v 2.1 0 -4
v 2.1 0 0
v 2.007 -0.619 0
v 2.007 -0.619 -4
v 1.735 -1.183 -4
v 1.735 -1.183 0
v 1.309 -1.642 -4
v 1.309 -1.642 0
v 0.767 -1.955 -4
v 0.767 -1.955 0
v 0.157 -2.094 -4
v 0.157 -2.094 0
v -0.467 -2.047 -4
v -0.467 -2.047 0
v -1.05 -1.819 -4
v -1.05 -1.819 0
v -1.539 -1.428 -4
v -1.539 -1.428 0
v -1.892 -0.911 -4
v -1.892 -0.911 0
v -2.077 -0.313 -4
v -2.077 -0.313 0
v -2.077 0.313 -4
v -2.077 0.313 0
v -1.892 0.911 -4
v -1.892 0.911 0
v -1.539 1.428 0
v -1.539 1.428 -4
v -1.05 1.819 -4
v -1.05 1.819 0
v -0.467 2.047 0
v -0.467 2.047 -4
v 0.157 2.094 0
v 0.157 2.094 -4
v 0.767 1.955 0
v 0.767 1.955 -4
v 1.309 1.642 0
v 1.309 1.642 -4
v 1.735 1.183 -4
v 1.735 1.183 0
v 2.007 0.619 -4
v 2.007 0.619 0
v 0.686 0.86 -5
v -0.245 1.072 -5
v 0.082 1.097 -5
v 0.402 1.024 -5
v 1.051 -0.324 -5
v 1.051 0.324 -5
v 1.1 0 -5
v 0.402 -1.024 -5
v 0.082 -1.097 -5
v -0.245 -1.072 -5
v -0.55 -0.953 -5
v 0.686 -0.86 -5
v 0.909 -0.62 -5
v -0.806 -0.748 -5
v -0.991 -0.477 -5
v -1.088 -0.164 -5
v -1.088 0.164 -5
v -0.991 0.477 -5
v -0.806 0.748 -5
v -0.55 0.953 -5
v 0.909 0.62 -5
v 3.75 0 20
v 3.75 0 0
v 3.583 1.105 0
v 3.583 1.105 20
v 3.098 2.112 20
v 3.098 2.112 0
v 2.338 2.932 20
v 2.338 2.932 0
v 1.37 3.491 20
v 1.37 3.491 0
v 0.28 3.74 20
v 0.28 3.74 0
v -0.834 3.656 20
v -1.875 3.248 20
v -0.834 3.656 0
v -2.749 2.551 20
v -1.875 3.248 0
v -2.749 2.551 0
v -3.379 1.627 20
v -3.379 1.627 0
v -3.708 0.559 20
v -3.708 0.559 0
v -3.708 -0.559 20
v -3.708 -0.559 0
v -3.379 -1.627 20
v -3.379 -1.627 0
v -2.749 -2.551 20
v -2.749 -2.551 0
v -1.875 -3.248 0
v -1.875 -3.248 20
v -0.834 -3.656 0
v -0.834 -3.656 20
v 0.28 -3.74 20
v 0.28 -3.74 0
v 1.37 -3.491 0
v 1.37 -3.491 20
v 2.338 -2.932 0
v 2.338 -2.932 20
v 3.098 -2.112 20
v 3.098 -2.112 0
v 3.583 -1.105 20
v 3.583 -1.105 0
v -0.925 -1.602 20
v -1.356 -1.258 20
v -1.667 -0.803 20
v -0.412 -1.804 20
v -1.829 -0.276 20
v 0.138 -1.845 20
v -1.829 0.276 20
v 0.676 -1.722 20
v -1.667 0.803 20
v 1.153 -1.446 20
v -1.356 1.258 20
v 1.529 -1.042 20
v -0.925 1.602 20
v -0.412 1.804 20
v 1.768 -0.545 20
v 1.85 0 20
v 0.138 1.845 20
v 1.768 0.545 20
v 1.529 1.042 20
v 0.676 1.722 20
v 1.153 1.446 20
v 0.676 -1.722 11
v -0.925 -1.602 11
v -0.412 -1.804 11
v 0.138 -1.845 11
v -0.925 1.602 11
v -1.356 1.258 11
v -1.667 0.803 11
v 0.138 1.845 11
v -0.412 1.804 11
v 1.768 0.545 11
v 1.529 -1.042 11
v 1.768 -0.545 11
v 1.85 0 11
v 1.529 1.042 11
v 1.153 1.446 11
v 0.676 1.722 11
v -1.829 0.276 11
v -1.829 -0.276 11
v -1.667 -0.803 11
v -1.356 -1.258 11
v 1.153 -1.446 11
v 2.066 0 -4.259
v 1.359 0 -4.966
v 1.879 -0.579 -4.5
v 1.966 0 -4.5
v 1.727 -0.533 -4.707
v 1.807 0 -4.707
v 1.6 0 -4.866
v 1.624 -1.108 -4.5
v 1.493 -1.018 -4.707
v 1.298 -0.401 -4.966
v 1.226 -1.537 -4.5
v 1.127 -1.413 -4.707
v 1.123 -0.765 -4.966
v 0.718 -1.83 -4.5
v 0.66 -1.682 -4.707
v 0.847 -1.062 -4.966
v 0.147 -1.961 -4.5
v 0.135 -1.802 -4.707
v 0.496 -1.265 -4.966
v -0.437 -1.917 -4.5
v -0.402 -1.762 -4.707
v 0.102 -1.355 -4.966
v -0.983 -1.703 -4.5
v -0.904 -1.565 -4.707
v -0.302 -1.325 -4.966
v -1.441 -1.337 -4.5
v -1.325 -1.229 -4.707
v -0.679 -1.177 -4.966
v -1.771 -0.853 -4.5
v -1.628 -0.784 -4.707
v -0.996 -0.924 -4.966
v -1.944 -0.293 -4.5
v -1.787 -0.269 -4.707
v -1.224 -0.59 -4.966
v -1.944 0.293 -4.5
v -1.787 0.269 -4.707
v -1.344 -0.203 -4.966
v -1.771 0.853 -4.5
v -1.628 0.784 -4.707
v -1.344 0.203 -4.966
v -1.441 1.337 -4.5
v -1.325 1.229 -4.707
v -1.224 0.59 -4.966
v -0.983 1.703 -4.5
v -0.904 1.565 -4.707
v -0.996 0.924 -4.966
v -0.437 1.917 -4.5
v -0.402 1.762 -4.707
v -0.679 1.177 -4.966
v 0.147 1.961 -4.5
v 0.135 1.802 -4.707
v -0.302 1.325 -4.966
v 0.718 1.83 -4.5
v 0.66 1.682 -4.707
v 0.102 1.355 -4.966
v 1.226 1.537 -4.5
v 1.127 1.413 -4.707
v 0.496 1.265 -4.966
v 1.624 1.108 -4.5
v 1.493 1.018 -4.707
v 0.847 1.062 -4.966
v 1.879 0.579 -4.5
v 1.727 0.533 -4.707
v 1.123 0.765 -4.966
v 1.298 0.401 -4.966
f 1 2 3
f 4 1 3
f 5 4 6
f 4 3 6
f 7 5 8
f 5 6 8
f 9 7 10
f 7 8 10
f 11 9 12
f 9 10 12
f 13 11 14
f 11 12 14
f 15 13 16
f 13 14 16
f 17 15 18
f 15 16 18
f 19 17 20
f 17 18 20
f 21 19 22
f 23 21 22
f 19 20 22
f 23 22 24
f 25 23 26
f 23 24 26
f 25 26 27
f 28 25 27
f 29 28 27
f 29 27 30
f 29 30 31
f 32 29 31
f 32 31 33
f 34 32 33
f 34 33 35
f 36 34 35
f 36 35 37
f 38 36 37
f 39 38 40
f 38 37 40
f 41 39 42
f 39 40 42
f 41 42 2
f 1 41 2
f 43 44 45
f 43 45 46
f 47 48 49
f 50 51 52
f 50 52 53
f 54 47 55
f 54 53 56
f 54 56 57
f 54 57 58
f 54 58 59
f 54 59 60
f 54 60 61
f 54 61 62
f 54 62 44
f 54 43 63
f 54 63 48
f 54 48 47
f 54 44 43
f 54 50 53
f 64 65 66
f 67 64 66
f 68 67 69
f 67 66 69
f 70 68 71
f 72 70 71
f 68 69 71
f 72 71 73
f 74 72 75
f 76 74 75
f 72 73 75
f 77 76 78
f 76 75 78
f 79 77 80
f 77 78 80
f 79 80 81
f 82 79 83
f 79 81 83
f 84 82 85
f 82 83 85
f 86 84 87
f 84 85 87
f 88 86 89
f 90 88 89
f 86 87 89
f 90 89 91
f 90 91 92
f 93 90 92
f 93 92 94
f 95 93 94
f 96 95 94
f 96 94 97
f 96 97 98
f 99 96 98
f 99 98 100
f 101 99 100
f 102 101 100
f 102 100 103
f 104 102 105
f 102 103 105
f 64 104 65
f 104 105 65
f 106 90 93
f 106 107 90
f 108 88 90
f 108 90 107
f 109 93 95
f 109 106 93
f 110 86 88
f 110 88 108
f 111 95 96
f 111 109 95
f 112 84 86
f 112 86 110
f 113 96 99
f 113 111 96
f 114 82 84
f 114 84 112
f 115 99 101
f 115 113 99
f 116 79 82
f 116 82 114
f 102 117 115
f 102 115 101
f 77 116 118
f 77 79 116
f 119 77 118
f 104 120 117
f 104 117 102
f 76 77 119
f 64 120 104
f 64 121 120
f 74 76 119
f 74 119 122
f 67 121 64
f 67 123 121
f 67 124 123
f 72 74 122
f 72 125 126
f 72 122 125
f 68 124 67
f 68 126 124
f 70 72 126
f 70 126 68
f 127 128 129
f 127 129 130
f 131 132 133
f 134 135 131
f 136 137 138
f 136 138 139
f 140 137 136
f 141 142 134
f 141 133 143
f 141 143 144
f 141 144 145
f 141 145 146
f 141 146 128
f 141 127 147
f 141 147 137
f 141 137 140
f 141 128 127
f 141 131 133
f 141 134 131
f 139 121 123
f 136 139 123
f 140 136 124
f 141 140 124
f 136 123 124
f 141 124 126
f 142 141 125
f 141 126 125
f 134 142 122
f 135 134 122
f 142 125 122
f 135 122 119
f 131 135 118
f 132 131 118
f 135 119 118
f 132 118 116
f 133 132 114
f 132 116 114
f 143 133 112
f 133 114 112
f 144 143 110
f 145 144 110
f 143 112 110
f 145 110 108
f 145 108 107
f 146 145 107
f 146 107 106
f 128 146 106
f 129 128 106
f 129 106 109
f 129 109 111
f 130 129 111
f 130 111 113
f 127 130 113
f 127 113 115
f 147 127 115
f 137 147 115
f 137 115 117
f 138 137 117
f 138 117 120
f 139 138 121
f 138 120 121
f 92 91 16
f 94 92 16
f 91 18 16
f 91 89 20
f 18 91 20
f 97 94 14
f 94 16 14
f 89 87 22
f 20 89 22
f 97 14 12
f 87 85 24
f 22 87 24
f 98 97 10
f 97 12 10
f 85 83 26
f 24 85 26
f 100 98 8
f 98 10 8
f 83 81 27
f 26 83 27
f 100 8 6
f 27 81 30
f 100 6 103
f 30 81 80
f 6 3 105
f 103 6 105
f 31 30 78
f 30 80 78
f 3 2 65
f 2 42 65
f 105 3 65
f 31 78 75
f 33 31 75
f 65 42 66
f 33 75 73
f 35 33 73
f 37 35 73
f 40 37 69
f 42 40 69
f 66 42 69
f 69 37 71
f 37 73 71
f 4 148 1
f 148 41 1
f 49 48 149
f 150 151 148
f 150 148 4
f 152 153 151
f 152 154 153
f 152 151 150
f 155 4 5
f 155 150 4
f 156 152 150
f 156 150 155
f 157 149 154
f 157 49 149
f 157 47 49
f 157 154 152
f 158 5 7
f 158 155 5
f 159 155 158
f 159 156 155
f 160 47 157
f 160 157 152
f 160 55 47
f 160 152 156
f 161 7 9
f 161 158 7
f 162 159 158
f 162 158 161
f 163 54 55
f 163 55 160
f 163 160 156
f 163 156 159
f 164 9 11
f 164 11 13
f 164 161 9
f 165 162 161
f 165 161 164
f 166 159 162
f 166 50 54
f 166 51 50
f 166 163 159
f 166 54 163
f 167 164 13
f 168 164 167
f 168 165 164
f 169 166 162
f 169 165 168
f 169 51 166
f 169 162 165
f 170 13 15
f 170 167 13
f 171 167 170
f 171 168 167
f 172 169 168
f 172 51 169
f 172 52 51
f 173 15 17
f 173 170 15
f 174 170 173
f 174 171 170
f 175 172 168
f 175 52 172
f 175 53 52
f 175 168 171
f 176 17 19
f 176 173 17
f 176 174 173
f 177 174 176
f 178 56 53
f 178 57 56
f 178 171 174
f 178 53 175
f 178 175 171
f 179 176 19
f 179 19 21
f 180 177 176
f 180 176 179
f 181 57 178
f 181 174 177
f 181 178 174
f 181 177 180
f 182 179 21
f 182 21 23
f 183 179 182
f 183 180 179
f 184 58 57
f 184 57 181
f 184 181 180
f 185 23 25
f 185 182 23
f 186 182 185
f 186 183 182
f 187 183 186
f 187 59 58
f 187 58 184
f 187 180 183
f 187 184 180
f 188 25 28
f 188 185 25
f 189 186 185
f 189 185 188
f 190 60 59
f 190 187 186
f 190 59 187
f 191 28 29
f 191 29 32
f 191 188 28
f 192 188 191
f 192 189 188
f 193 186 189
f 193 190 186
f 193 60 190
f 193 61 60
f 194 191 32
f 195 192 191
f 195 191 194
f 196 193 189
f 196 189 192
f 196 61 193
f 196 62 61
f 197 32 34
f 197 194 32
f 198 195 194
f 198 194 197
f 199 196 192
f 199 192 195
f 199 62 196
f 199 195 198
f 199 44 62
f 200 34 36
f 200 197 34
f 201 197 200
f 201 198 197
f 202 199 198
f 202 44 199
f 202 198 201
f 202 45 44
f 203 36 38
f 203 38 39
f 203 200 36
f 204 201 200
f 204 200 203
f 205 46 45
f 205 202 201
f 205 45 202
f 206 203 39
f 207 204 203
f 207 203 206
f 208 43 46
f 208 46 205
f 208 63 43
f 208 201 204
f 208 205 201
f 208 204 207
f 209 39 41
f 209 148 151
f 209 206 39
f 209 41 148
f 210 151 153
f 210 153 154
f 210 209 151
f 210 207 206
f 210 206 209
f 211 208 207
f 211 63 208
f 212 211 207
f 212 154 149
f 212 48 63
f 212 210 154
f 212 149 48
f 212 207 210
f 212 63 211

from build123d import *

# Parameters (mm, degrees)
SKETCH_R     = 3.75
PAD_DEPTH    = 20
SKETCH001_R  = 1.85
POCKET_DEPTH = 9
SKETCH002_R  = 2.1
PAD001_DEPTH = 5
FILLET_R     = 1


with BuildPart() as part:
    # Sketch → Pad (new body)
    with BuildSketch(Plane.XY):
        Circle(SKETCH_R)
    extrude(amount=PAD_DEPTH)

    # Sketch001 (on Face3 of Pad) → Pocket (cut)
    with BuildSketch(Plane.XY.offset(20)):
        Circle(SKETCH001_R)
    extrude(amount=-POCKET_DEPTH, mode=Mode.SUBTRACT)

    # Sketch002 (on Face2 of Pocket) → Pad001 (join)
    with BuildSketch(Plane(origin=(0, 0, 0), x_dir=(1, 0, 0), z_dir=(0, 0, -1))):
        Circle(SKETCH002_R)
    extrude(amount=PAD001_DEPTH)

    # Fillet
    fillet_edges = [part.edges().sort_by_distance(p)[0] for p in [
        (-2.1, 0, -5),
    ]]
    fillet(fillet_edges, radius=FILLET_R)


solid = part.part
